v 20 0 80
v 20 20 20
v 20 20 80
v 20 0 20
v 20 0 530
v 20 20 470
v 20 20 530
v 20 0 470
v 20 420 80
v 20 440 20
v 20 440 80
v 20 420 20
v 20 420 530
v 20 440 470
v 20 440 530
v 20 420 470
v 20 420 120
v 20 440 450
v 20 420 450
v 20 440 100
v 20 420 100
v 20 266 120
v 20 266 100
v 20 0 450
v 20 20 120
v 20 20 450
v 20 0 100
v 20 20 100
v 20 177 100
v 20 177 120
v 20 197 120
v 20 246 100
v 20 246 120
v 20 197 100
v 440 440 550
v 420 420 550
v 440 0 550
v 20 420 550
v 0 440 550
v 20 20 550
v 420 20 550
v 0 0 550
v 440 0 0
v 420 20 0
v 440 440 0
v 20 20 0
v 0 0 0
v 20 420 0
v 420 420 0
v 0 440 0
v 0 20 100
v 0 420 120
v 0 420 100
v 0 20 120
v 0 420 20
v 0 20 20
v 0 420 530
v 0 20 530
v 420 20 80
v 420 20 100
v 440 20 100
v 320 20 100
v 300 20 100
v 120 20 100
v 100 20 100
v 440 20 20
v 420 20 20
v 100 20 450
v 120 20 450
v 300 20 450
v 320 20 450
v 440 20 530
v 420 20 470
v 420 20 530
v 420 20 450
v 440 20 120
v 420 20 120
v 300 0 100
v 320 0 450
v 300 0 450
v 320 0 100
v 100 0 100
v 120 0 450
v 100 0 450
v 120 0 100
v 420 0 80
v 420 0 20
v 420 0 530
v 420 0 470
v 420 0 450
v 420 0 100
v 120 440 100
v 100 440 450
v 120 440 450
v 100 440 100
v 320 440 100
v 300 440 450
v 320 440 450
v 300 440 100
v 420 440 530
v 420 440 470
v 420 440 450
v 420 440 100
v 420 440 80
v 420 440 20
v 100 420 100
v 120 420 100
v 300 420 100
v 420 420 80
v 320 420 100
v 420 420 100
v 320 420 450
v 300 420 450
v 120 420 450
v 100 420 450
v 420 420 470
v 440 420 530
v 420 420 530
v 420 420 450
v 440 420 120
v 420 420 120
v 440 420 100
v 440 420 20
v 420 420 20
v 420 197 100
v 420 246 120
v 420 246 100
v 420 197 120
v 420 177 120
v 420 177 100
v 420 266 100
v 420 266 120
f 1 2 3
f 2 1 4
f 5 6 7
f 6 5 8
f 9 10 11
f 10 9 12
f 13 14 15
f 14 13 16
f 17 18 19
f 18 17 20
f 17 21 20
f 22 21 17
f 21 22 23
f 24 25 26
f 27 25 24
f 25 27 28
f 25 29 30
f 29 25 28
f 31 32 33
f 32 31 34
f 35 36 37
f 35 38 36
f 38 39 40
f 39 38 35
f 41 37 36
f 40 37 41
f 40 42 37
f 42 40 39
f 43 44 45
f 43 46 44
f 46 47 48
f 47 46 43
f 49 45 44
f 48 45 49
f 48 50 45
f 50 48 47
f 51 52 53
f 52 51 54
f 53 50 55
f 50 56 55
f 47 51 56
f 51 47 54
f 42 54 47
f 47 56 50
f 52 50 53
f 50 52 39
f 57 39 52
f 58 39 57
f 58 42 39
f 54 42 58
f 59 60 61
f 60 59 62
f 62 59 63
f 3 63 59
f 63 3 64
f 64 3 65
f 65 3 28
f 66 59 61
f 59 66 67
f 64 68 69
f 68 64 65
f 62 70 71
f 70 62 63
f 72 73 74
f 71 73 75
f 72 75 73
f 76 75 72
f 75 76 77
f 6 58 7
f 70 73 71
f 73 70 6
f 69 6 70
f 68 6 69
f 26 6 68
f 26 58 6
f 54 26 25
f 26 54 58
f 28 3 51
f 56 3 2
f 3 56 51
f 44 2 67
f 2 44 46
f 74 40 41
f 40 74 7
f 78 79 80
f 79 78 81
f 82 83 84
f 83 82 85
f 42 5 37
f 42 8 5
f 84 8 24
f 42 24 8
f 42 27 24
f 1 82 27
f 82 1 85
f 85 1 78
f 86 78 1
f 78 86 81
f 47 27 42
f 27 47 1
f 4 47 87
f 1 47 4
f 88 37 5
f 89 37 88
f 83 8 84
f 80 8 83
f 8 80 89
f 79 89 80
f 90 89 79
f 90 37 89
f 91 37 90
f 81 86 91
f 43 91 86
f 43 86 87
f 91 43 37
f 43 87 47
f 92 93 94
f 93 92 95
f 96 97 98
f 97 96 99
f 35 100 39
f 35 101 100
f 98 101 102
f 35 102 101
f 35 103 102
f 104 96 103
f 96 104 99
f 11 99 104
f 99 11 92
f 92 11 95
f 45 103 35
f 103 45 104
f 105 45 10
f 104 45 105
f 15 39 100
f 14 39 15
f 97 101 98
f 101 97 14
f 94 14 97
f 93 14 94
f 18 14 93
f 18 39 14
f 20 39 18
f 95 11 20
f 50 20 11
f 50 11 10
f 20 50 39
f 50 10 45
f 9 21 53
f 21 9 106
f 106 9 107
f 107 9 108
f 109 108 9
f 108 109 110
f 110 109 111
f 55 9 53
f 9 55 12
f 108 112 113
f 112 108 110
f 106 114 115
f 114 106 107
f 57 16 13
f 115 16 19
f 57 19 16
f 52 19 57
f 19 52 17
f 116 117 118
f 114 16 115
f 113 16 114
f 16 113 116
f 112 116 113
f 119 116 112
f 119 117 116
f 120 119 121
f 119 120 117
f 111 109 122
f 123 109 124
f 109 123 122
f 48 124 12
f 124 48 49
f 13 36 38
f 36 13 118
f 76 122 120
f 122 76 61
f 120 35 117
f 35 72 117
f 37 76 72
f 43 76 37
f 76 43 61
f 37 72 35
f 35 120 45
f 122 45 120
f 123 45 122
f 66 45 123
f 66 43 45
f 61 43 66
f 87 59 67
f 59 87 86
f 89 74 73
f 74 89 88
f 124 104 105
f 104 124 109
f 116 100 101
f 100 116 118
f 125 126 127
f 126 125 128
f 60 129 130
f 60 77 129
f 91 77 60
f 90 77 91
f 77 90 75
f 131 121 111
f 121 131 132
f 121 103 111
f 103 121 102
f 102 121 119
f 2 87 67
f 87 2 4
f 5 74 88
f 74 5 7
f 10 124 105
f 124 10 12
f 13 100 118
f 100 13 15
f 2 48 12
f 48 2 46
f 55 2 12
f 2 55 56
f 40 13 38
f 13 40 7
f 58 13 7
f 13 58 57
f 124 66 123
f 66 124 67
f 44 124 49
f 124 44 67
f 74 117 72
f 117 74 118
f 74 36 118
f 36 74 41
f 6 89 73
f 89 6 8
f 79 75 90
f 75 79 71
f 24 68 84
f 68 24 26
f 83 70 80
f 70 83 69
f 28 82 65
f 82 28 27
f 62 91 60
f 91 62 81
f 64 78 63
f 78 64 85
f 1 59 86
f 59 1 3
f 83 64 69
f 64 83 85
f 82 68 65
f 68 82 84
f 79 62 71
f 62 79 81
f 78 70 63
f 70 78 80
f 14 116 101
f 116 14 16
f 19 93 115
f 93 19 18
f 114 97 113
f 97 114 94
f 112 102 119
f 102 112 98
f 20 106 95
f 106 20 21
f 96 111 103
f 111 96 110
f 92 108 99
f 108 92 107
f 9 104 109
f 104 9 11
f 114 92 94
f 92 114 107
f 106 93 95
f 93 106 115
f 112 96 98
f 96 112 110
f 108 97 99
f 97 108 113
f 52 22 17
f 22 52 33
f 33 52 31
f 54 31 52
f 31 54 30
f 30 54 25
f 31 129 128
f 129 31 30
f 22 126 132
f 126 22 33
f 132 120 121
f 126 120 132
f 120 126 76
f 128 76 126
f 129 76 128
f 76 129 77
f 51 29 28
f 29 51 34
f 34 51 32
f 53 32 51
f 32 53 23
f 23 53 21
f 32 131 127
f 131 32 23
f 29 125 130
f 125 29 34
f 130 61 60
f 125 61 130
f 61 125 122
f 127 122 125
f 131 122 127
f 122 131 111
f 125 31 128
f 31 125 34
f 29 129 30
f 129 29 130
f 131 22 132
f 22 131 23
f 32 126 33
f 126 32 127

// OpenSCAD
// file: corexy.scad
include <frame.scad>
include <MCAD/motors.scad>


corexy_beams_offset = 80;
corexy_nema_width   = 40;

module corexy() {
    // left motor
    translate([frame_y_beam_width + corexy_nema_width/2, frame_x_beam_width + corexy_nema_width/2, frame_depth - frame_x_beam_height ])
        rotate([180, 0, 0])
            stepper_motor_mount(17);

    // right motor
    translate([frame_y_beam_length , frame_x_beam_width + corexy_nema_width/2, frame_depth - frame_x_beam_height ])
        rotate([180, 0, 0])
            stepper_motor_mount(17);

    // front beam
    translate([frame_support_width, frame_support_width + corexy_nema_width, frame_depth - frame_x_beam_height]) frame_x_beam();

    // left and right beams for rails
    translate([0, frame_support_height, frame_depth - corexy_beams_offset ]) frame_y_beam();
    translate([frame_right_x, frame_support_height, frame_depth - corexy_beams_offset ]) frame_y_beam();
}
// file: z-axis.scad
include <frame.scad>
include <MCAD/motors.scad>

z_axis_nema_width = 46;
z_axis_nema_depth = 40;
z_axis_top_offset = 100;
z_axis_vertical_support_length = 350;
z_axis_vertical_support_width  = 20;
z_axis_vertical_support_height = 20;

module z_axis_vertical_support() {
    color([0,0,1])
    cube([z_axis_vertical_support_width, z_axis_vertical_support_height, z_axis_vertical_support_length]);
}

module z_axis_ball_screw_support() {
    // ball screw support
    for(y=[0, frame_rear_y]) {
        translate([frame_support_width, y, frame_depth - z_axis_top_offset]) frame_x_beam();
        translate([frame_support_width, y, frame_depth - z_axis_top_offset - z_axis_vertical_support_length - frame_x_beam_height ]) frame_x_beam();
        translate([100, y, frame_depth - z_axis_top_offset - z_axis_vertical_support_length ]) z_axis_vertical_support();
        translate([300, y, frame_depth - z_axis_top_offset - z_axis_vertical_support_length ]) z_axis_vertical_support();
    }

}


module z_axis_nema_support() {
    z = 100;
   // y
    translate([0, frame_support_height, z]) frame_y_beam();
    translate([frame_right_x, frame_support_height, z]) frame_y_beam();

   // x
   translate([frame_support_width, frame_y_beam_length / 2 - z_axis_nema_width/2, z]) frame_x_beam();
   translate([frame_support_width, frame_y_beam_length / 2 + z_axis_nema_width, z]) frame_x_beam();

    translate([frame_support_width + z_axis_nema_width/2
            , frame_y_beam_length / 2 + z_axis_nema_width/2
            , z + z_axis_nema_depth / 2])
            stepper_motor_mount(17);

}

module z_axis() {

    z_axis_ball_screw_support();
    z_axis_nema_support();

}
// file: frame.scad
frame_x_beam_length  = 400;
frame_x_beam_width   = 20;
frame_x_beam_height  = 20;

frame_y_beam_length  = 400;
frame_y_beam_width   = 20;
frame_y_beam_height  = 20;

frame_support_width  = 20;
frame_support_height = 20;
frame_support_length = 550;

frame_width  = frame_support_width  * 2 + frame_x_beam_width;
frame_height = frame_support_height * 2 + frame_y_beam_width;
frame_depth  = frame_support_length;

frame_rear_y = frame_support_height + frame_support_height - frame_x_beam_width  + frame_y_beam_length;
frame_right_x = frame_y_beam_length + frame_support_width + frame_support_width - frame_y_beam_width;

module frame_x_beam() {
   color([1,0,0]) cube([frame_x_beam_length, frame_x_beam_width, frame_x_beam_height]);
}

module frame_y_beam() {
   color([0,1,0]) cube([frame_y_beam_width, frame_y_beam_length, frame_y_beam_height]);
}

module frame_support() {
    cube([frame_support_width, frame_support_height, frame_depth]);
}

module main_frame() {
    // support
    for(x=[0, frame_support_width + frame_x_beam_length]) {
        for(y=[0, frame_support_height + frame_y_beam_length]) {
            translate([x, y, 0 ])  frame_support();
        }
    }

    // front and rear beams
    for(y=[0, frame_support_height + frame_support_height - frame_x_beam_width  + frame_y_beam_length ])
        for(z=[0, frame_depth - frame_x_beam_height]) {
            translate([frame_support_width, y, z]) frame_x_beam();
    }

    // right and left beams
    for(x=[0, frame_y_beam_length + frame_support_width + frame_support_width - frame_y_beam_width])
        for(z=[0, frame_depth - frame_y_beam_height]) {
            translate([x, frame_support_height, z]) frame_y_beam();
    }
}
// main file
include <frame.scad>
include <z-axis.scad>
include <corexy.scad>
include <MCAD/motors.scad>


main_frame();
z_axis();
corexy();
